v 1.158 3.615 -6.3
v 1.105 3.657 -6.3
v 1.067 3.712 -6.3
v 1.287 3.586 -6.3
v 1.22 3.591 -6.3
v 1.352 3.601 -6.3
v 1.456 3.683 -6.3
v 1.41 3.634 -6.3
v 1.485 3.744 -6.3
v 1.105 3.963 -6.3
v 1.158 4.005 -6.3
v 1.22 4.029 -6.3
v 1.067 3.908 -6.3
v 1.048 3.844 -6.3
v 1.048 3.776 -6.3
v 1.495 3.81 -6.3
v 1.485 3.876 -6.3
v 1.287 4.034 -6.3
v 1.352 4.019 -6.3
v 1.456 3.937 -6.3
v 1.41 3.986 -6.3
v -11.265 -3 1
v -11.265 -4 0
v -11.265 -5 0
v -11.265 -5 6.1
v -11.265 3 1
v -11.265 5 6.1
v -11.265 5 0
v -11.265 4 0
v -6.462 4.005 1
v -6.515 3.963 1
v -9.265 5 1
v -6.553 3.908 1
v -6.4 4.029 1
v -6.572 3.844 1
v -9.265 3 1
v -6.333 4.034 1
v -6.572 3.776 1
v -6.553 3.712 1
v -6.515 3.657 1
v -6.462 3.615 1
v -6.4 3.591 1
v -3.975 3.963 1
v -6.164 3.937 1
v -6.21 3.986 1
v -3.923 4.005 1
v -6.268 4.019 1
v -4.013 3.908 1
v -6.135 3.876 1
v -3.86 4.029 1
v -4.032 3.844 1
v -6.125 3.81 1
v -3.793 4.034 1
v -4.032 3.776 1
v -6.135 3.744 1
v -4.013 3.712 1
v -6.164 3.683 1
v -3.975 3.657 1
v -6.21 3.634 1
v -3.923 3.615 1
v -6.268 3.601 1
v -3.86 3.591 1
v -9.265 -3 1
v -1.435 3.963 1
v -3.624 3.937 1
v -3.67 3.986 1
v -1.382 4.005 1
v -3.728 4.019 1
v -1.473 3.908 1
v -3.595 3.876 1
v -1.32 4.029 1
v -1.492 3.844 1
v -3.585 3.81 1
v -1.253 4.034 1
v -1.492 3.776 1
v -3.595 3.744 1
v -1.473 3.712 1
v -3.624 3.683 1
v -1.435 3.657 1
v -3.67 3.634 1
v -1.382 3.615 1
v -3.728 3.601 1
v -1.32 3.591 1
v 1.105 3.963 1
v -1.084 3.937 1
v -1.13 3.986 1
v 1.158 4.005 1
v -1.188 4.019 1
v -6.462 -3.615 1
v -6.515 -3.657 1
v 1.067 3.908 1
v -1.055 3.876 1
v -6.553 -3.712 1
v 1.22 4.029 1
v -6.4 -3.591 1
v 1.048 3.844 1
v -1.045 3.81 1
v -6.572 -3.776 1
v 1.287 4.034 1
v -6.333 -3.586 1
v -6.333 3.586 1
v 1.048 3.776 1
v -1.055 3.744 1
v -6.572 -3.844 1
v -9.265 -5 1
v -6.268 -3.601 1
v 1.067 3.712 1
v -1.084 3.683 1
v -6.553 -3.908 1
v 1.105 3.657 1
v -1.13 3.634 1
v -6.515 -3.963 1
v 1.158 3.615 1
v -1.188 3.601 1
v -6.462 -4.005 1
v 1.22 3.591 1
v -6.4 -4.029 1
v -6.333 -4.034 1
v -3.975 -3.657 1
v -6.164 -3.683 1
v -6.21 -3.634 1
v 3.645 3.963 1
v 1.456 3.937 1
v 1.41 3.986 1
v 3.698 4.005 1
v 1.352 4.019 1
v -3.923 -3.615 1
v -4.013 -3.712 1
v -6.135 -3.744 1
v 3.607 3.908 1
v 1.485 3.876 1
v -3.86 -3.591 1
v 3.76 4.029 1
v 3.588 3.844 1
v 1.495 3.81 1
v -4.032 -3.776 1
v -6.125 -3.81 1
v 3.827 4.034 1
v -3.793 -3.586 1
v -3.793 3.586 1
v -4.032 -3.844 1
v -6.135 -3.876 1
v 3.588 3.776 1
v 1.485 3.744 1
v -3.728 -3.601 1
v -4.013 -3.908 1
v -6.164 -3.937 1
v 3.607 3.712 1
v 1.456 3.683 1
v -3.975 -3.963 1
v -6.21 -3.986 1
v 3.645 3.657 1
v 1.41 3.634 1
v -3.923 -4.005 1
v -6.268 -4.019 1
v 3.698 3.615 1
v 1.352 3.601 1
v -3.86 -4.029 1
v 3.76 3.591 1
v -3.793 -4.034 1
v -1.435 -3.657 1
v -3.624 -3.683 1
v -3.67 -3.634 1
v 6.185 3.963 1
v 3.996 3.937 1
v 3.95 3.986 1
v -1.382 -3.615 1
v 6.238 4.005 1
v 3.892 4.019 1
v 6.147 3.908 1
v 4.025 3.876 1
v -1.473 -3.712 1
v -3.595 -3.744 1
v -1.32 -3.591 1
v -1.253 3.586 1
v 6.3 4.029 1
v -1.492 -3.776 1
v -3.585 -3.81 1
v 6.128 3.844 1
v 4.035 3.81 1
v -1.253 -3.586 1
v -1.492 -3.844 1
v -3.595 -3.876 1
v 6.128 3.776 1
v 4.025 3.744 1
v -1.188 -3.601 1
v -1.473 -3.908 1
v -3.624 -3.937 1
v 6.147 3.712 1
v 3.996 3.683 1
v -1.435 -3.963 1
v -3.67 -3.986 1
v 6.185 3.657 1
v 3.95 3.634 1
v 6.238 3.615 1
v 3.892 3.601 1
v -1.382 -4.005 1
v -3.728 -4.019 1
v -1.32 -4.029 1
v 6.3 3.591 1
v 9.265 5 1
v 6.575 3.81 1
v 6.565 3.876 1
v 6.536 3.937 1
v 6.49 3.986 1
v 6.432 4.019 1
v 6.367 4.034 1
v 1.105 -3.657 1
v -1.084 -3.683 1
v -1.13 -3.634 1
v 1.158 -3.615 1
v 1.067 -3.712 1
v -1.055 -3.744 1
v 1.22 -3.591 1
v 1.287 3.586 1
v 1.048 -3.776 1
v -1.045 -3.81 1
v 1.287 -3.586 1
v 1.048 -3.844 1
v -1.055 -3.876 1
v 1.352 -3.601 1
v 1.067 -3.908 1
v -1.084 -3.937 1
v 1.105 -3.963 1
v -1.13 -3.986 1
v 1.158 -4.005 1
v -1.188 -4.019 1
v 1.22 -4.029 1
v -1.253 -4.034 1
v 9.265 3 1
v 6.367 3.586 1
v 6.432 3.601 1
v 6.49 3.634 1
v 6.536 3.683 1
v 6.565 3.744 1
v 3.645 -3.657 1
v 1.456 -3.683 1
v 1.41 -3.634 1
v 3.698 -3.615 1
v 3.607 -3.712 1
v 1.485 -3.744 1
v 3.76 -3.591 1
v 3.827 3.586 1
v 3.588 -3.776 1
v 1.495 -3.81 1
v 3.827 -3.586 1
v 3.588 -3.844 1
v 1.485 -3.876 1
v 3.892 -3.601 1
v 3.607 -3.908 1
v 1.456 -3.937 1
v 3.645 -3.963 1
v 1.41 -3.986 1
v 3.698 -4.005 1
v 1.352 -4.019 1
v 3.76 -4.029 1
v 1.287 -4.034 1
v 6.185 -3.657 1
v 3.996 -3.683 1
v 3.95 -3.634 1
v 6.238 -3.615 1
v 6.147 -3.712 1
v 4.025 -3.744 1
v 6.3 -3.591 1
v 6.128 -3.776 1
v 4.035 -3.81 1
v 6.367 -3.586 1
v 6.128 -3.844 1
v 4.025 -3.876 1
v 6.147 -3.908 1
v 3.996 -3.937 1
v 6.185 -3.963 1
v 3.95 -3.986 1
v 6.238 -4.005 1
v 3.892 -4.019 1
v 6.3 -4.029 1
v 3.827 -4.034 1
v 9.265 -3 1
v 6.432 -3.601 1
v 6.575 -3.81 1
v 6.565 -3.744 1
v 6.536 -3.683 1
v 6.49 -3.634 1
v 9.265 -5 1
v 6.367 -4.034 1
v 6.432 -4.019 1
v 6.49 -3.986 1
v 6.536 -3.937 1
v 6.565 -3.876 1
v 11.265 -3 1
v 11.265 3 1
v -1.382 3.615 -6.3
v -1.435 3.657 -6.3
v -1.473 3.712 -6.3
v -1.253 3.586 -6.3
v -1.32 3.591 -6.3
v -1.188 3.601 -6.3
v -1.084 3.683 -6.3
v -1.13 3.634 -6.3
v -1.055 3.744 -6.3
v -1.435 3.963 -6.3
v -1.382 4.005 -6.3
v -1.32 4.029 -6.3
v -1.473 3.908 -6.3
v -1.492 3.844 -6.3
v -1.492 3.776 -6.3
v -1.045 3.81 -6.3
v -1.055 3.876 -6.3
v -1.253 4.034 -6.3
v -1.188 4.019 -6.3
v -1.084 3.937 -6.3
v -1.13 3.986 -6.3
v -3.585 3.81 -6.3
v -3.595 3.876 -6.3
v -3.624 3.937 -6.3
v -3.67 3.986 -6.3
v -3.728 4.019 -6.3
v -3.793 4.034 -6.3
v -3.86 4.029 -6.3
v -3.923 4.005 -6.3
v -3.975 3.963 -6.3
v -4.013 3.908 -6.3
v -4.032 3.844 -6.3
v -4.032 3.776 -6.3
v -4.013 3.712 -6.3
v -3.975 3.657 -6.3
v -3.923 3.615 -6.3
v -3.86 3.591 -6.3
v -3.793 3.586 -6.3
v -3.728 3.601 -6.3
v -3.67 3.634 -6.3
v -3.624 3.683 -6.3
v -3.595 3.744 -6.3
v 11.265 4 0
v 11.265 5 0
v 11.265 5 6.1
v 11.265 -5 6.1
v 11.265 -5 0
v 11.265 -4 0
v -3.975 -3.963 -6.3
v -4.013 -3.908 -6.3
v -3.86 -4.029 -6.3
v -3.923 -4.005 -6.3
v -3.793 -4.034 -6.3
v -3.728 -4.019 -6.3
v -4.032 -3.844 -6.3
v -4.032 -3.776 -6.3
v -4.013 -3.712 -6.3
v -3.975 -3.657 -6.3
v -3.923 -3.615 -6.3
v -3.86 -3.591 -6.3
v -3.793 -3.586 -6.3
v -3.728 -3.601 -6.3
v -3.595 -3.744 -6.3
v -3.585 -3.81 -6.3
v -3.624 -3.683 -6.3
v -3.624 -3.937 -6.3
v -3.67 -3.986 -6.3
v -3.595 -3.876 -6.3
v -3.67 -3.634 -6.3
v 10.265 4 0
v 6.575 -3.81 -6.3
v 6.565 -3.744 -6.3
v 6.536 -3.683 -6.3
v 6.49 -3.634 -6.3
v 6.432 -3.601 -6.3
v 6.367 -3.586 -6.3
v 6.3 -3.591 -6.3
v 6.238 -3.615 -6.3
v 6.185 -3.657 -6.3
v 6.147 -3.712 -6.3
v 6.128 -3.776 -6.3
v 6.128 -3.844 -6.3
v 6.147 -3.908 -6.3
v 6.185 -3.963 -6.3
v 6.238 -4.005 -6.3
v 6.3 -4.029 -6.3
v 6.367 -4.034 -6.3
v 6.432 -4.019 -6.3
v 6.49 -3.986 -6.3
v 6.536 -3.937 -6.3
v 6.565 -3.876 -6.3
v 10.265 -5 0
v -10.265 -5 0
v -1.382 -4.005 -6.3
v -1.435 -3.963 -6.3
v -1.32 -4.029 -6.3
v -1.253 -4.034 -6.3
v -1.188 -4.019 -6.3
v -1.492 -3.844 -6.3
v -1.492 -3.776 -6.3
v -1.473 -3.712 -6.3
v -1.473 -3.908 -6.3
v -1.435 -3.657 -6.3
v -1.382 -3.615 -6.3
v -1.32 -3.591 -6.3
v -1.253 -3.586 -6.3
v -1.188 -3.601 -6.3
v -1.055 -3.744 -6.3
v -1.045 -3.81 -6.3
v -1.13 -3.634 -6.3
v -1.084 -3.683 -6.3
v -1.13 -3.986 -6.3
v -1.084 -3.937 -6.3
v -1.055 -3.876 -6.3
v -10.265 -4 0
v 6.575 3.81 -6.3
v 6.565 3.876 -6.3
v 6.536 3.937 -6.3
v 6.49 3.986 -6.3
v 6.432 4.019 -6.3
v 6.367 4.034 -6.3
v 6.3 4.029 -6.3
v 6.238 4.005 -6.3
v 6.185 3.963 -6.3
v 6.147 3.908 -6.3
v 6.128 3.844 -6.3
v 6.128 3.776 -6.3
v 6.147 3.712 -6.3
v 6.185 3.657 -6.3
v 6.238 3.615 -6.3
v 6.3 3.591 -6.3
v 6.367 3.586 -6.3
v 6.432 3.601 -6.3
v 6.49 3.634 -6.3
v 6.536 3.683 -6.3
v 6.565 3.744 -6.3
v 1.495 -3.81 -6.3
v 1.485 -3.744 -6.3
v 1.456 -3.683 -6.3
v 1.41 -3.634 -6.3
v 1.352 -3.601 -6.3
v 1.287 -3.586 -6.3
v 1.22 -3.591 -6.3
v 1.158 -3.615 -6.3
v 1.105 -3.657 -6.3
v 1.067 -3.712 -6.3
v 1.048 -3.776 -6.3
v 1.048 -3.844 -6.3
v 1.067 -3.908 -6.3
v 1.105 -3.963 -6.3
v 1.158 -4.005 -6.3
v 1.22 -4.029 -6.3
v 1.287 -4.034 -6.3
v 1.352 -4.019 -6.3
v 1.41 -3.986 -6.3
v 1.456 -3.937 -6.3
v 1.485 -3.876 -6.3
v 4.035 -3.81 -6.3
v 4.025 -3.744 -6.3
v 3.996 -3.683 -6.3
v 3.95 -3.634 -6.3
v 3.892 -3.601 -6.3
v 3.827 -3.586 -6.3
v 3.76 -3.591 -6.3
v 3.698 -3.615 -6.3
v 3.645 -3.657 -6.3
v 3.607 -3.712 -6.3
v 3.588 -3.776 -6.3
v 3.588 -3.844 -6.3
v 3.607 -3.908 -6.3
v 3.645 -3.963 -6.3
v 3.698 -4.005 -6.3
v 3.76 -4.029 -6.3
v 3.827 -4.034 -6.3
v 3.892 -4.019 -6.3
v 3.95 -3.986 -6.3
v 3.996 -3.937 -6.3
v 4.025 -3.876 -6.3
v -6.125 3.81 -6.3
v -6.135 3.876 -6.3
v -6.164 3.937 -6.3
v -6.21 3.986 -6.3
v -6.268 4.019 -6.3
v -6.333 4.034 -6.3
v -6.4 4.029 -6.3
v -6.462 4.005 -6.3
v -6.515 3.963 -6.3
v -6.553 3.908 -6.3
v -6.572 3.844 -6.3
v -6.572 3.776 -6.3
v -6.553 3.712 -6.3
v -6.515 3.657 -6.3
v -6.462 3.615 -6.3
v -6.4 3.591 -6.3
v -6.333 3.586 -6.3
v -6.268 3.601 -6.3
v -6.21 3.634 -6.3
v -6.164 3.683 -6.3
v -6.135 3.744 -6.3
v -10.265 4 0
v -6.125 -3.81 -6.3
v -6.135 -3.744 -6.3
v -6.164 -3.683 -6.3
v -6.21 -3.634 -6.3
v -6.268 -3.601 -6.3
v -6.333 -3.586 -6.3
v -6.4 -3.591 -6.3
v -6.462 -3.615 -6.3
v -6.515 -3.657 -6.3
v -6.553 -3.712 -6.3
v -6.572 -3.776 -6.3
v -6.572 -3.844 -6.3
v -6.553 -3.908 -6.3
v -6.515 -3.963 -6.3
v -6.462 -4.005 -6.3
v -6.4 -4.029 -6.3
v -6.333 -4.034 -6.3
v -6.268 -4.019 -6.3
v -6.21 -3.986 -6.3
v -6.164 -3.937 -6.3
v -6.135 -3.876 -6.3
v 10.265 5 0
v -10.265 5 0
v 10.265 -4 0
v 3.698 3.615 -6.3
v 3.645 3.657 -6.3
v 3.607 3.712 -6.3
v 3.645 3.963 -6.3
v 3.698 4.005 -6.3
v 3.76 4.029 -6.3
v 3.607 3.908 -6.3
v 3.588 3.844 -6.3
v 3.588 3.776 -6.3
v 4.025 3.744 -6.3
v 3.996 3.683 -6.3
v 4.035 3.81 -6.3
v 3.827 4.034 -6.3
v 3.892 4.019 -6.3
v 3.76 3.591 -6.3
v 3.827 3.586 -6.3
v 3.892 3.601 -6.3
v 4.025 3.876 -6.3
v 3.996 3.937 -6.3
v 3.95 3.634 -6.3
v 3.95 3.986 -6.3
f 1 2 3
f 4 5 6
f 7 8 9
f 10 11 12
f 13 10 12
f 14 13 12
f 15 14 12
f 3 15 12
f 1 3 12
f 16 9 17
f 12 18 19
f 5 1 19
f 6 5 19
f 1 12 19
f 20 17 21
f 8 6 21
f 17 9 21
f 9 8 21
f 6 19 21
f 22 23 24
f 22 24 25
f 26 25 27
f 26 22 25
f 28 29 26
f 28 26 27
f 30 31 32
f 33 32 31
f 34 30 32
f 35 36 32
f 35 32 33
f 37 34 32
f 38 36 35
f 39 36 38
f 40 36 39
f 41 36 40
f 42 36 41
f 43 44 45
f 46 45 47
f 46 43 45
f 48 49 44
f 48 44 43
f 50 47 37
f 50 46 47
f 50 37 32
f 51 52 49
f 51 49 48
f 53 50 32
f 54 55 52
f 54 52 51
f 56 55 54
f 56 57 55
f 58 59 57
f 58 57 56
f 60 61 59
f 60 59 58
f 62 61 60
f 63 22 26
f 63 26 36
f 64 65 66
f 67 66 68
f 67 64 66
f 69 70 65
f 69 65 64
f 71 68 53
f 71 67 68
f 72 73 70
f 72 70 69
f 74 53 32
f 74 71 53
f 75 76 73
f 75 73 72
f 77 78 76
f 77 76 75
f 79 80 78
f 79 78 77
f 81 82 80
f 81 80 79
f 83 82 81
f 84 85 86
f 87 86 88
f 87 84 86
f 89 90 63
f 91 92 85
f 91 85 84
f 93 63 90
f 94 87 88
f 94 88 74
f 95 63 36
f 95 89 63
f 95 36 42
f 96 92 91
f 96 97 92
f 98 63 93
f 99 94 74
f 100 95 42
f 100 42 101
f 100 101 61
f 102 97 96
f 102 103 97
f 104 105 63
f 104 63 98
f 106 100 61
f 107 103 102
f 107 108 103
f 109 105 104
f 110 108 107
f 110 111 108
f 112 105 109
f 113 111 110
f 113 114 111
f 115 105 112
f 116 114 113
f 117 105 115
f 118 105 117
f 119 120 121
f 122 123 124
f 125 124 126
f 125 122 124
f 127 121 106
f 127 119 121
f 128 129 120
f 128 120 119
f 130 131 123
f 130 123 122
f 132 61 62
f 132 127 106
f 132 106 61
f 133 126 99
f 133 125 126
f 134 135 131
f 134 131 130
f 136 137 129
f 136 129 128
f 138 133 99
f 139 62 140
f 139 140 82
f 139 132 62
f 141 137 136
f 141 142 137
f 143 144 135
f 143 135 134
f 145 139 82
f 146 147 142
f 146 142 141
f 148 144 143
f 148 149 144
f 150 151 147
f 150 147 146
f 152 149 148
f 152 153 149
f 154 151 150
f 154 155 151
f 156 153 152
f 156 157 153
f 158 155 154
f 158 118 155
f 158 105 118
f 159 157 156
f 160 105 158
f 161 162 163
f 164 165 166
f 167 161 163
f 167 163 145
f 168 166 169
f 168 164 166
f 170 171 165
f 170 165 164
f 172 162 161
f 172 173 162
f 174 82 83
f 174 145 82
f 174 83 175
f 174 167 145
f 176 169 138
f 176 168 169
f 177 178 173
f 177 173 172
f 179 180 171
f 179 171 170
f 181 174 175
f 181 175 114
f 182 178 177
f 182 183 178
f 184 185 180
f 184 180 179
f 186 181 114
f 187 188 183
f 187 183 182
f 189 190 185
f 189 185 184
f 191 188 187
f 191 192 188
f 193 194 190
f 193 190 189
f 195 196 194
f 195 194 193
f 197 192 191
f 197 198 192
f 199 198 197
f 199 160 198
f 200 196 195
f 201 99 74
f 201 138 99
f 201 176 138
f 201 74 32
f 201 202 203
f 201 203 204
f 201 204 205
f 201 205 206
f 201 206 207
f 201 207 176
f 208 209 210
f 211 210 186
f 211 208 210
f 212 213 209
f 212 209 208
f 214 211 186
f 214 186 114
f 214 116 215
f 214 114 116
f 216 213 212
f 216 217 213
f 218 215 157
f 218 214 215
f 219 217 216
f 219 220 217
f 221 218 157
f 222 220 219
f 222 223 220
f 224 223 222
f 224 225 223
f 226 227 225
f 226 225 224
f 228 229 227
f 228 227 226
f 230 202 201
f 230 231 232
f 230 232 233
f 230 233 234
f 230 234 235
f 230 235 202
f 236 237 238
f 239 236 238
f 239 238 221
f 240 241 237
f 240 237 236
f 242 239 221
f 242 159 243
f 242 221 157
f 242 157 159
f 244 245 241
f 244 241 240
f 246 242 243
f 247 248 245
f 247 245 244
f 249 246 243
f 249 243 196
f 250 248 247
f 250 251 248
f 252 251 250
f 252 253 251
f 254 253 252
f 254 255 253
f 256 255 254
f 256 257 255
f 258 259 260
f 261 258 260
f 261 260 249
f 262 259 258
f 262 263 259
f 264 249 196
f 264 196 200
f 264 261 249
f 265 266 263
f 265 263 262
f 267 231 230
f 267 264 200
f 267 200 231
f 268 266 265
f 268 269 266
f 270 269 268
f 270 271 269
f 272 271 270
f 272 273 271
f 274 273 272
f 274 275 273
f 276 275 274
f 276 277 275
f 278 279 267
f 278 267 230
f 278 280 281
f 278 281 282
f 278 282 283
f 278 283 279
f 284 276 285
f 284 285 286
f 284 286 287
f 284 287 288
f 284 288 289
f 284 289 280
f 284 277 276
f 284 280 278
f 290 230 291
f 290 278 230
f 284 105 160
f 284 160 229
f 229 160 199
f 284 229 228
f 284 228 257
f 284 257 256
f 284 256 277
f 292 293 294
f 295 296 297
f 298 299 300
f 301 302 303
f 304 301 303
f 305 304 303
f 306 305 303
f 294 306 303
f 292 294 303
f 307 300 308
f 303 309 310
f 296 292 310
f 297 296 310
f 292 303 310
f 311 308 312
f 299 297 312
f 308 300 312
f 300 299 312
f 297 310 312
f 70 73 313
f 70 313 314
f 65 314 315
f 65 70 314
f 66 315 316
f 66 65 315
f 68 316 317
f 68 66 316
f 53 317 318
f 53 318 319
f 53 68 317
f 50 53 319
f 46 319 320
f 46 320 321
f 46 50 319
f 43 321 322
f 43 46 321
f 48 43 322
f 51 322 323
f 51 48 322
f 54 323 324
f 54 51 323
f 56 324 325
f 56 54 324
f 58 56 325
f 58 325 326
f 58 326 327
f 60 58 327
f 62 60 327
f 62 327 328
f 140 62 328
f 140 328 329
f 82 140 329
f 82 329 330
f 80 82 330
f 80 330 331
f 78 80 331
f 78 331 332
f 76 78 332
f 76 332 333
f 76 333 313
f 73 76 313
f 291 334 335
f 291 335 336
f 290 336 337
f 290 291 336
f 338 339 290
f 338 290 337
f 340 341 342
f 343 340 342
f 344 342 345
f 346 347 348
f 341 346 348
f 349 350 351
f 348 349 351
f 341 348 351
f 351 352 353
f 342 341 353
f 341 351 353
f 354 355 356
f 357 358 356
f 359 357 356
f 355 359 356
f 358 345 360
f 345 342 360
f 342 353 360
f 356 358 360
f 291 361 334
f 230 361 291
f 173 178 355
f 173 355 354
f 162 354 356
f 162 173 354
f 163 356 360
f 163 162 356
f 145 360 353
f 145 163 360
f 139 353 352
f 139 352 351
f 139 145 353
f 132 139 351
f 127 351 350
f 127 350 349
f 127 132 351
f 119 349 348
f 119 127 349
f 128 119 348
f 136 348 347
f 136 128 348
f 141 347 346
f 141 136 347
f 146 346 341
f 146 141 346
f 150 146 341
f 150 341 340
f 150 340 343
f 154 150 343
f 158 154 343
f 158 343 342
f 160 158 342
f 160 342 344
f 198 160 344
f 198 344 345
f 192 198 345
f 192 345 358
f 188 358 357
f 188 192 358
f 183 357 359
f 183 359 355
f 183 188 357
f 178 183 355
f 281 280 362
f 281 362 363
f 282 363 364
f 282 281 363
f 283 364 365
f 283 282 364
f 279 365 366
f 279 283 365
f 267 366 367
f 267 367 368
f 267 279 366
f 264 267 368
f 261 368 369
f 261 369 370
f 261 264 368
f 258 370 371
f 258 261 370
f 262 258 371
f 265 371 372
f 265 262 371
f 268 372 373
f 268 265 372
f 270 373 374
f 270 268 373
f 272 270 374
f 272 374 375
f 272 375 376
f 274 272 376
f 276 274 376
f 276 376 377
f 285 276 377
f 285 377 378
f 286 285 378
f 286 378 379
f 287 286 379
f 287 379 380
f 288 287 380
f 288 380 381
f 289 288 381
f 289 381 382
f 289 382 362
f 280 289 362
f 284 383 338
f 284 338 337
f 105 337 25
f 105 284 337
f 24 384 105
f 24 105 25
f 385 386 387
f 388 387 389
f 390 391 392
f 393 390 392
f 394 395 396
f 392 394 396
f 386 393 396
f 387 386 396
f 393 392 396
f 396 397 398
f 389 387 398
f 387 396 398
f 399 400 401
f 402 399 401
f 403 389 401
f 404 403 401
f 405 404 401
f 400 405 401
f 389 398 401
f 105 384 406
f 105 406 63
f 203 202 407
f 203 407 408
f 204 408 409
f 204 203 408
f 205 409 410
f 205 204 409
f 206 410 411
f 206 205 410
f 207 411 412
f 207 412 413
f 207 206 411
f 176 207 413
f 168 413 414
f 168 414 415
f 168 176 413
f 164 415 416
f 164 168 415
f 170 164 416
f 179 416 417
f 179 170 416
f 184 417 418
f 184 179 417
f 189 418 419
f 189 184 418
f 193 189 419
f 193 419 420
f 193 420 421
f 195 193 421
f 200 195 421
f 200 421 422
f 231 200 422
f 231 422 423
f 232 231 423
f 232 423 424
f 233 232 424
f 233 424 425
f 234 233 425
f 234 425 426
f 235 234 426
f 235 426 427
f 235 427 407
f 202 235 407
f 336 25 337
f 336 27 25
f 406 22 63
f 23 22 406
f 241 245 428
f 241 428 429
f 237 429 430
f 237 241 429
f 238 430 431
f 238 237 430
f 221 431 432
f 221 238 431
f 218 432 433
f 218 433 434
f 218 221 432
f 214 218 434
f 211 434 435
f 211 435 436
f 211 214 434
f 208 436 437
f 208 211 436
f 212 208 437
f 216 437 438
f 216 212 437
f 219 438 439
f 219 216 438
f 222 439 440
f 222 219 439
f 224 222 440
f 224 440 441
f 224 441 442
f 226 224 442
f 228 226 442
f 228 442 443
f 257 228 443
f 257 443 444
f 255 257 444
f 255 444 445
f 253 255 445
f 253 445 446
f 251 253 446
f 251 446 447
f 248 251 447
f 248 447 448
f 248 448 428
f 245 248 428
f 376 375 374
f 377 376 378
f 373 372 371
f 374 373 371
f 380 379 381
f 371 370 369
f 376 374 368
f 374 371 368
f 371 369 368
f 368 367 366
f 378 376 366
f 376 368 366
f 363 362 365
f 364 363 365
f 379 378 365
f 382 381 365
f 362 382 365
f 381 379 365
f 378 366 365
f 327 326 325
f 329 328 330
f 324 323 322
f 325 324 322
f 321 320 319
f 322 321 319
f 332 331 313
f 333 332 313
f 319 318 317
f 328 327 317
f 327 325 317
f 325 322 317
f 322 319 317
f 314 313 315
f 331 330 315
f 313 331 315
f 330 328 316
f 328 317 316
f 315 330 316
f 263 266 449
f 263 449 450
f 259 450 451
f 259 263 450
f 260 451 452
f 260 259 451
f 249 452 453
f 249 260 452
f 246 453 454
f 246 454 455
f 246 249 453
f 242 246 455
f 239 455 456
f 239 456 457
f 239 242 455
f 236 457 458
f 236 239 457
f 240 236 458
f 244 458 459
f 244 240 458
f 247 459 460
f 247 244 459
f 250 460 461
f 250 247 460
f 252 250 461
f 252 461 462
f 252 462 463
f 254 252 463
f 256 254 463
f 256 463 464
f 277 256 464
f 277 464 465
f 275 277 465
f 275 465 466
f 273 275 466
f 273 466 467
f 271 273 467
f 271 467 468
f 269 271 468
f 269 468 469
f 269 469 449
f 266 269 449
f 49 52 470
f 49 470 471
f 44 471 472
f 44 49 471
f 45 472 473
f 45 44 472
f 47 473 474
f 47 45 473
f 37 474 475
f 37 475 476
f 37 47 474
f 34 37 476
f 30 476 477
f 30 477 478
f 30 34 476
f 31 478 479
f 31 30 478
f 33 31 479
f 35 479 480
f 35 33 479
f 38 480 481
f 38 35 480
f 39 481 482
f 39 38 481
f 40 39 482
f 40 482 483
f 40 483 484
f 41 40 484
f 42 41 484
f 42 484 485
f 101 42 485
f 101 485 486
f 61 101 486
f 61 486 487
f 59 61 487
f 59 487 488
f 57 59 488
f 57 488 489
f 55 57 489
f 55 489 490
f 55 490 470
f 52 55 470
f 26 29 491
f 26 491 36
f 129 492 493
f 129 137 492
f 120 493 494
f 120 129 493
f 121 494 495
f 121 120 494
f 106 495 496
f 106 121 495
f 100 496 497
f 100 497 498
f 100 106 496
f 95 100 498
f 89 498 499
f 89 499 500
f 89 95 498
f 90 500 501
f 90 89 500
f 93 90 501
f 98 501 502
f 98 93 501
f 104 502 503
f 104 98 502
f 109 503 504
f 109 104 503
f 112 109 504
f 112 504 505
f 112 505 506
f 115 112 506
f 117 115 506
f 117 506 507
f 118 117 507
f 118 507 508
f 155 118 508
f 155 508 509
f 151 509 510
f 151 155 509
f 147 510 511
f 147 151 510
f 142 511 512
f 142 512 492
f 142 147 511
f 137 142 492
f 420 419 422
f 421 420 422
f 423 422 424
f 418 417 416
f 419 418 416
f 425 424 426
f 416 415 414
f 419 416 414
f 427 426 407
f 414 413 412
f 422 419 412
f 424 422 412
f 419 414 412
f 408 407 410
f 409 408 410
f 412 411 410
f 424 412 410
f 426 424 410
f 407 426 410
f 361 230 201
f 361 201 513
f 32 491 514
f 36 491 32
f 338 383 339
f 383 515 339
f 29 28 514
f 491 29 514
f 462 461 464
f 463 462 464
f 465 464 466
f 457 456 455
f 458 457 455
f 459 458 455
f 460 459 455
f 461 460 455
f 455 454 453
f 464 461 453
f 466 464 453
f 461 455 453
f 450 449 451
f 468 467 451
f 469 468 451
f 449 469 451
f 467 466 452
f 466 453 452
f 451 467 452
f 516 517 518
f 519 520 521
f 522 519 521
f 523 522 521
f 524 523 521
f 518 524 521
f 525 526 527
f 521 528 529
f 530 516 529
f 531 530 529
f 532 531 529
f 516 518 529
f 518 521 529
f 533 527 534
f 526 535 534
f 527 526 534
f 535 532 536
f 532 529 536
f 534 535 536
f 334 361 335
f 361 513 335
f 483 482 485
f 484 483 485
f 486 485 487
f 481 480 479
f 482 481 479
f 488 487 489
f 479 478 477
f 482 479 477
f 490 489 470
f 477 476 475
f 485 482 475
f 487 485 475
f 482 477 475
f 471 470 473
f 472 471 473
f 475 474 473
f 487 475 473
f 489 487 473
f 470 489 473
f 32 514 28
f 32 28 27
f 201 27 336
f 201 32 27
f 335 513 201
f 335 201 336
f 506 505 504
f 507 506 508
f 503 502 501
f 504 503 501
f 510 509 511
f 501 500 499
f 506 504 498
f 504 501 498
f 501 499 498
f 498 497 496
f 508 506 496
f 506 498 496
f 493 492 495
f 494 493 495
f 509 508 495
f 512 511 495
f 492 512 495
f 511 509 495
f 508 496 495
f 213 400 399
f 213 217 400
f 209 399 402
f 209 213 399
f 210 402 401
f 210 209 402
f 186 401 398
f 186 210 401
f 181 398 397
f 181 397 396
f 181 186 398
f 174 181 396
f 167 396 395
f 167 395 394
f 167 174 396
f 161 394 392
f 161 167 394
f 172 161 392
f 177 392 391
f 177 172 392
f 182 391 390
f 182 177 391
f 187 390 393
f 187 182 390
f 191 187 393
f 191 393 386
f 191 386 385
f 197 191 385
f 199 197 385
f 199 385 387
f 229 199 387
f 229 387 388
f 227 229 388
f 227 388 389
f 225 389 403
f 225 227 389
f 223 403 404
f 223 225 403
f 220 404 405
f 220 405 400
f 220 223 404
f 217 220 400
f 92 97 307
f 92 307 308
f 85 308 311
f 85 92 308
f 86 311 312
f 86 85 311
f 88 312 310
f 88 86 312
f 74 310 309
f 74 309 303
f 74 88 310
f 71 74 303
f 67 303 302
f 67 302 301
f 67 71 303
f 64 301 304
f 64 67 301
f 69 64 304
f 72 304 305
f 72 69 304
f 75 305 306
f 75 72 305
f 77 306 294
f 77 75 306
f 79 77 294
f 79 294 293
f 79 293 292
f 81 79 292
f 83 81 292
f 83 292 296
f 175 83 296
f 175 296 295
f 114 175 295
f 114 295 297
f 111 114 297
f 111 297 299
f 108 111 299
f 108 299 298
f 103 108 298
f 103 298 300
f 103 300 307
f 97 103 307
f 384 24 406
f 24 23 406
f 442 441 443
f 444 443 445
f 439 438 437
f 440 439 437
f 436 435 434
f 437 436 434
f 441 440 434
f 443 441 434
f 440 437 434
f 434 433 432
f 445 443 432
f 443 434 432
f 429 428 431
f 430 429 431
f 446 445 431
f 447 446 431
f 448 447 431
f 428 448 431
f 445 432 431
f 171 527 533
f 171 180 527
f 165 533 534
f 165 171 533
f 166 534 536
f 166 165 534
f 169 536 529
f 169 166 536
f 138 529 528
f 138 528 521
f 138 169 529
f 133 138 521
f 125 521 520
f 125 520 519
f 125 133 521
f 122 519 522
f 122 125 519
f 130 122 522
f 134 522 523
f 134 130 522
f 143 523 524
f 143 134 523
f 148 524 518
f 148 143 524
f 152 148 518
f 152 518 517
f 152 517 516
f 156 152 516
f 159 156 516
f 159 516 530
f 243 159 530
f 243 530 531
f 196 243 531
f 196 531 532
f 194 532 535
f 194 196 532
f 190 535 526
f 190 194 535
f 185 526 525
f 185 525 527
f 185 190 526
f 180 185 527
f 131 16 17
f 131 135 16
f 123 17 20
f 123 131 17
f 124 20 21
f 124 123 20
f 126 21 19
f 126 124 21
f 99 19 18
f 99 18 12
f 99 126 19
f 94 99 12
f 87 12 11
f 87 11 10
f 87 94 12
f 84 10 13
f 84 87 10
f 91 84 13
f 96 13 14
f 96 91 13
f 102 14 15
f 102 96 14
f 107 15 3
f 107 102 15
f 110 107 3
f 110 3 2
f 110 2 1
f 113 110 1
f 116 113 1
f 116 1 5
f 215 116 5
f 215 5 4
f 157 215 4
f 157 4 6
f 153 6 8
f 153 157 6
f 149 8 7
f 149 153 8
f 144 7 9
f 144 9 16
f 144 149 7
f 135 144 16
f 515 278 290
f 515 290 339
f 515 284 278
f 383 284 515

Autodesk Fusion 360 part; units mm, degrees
sketch "Sketch1" plane through (0, 0, 0) normal (0, 0, 1) x (1, 0, 0)
  line L0 (11.265, -5) -> (-11.265, -5)
  line L1 (-11.265, -5) -> (-11.265, 5)
  line L2 (-11.265, 5) -> (11.265, 5)
  line L3 (11.265, 5) -> (11.265, -5)
  line L4 (11.265, -5) -> (-11.265, 5) construction
  line L5 (-11.265, -5) -> (11.265, 5) construction
  line L6 (-11.265, 0) -> (11.265, 0)
  line L7 (0, 5) -> (0, -5)
  circle A0 centre (-6.35, 3.81) radius 0.225
  circle A1 centre (-3.81, 3.81) radius 0.225
  circle A2 centre (-1.27, 3.81) radius 0.225
  circle A3 centre (1.27, 3.81) radius 0.225
  circle A4 centre (3.81, 3.81) radius 0.225
  circle A5 centre (6.35, 3.81) radius 0.225
  circle A6 centre (-6.35, -3.81) radius 0.225
  circle A7 centre (-3.81, -3.81) radius 0.225
  circle A8 centre (-1.27, -3.81) radius 0.225
  circle A9 centre (1.27, -3.81) radius 0.225
  circle A10 centre (3.81, -3.81) radius 0.225
  circle A11 centre (6.35, -3.81) radius 0.225
  dimension "d1" = 22.53
  dimension "d2" = 10
  dimension "d4" = 0.45
  dimension "d5" = 12.7
  dimension "d6" = 7.62
  dimension "d9" = 2.54
  dimension "d10" = -7.62
extrude "Extrude1" add sketch "Sketch1" along normal blind 6.1 contours L0 L3 L6 L7 | L0 L1 L6 L7 | L2 L3 L6 L7 | L1 L2 L6 L7 | A0 | A1 | A2 | A3 | A4 | A5 | A6 | A7 | A8 | A9 | A10 | A11
sketch "Sketch2" plane through (0, -5, 0) normal (0, -1, 0) x (1, 0, 0)
  line L0 (-11.265, 0) -> (11.265, 0)
  line L1 (11.265, 0) -> (11.265, 6.1)
  line L2 (11.265, 6.1) -> (-11.265, 6.1)
  line L3 (-11.265, 6.1) -> (-11.265, 0)
  line L4 (-10.265, 0) -> (-9.265, 1)
  line L5 (-9.265, 1) -> (9.265, 1)
  line L6 (9.265, 1) -> (10.265, 0)
  line L7 (11.265, 0) -> (-11.265, 0)
  line L8 (0, 0) -> (0, 6.1)
  point P0 (-11.265, 0)
  point P1 (11.265, 0)
  dimension "d15" = 1
  dimension "d16" = 1
  dimension "d17" = 1
  dimension "d26" = 45
extrude "Extrude3" cut sketch "Sketch2" against normal up to surface (10 mm away) contours L0 L4 L5 L7 L8 | L0 L5 L6 L7 L8
sketch "Sketch3" plane through (-11.265, 0, 0) normal (-1, 0, 0) x (0, -1, 0)
  line L0 (-5, 0) -> (5, 0)
  line L1 (5, 0) -> (5, 6.1)
  line L2 (5, 6.1) -> (-5, 6.1)
  line L3 (-5, 6.1) -> (-5, 0)
  line L4 (-4, 0) -> (-3, 1)
  line L5 (-3, 1) -> (3, 1)
  line L6 (3, 1) -> (4, 0)
  line L7 (5, 0) -> (-5, 0)
  line L8 (-5, 0) -> (-4, 0)
  line L9 (0, 0) -> (0, 6.1)
  dimension "d22" = 1
  dimension "d23" = 1
  dimension "d24" = 1
  dimension "d25" = 45
extrude "Extrude4" cut sketch "Sketch3" against normal up to surface (22.53 mm away) contours L0 L4 L5 L7 L9 | L0 L5 L6 L7 L9
extrude "Extrude2" add sketch "Sketch1" against normal blind 7.3 from surface at 1 contours A0 | A1 | A2 | A3 | A4 | A5 | A6 | A7 | A8 | A9 | A10 | A11
equation "d5 = ( 2.54 * 5 ) * 1 mm"
equation "d13 = -6.30 mm - 1 mm"
